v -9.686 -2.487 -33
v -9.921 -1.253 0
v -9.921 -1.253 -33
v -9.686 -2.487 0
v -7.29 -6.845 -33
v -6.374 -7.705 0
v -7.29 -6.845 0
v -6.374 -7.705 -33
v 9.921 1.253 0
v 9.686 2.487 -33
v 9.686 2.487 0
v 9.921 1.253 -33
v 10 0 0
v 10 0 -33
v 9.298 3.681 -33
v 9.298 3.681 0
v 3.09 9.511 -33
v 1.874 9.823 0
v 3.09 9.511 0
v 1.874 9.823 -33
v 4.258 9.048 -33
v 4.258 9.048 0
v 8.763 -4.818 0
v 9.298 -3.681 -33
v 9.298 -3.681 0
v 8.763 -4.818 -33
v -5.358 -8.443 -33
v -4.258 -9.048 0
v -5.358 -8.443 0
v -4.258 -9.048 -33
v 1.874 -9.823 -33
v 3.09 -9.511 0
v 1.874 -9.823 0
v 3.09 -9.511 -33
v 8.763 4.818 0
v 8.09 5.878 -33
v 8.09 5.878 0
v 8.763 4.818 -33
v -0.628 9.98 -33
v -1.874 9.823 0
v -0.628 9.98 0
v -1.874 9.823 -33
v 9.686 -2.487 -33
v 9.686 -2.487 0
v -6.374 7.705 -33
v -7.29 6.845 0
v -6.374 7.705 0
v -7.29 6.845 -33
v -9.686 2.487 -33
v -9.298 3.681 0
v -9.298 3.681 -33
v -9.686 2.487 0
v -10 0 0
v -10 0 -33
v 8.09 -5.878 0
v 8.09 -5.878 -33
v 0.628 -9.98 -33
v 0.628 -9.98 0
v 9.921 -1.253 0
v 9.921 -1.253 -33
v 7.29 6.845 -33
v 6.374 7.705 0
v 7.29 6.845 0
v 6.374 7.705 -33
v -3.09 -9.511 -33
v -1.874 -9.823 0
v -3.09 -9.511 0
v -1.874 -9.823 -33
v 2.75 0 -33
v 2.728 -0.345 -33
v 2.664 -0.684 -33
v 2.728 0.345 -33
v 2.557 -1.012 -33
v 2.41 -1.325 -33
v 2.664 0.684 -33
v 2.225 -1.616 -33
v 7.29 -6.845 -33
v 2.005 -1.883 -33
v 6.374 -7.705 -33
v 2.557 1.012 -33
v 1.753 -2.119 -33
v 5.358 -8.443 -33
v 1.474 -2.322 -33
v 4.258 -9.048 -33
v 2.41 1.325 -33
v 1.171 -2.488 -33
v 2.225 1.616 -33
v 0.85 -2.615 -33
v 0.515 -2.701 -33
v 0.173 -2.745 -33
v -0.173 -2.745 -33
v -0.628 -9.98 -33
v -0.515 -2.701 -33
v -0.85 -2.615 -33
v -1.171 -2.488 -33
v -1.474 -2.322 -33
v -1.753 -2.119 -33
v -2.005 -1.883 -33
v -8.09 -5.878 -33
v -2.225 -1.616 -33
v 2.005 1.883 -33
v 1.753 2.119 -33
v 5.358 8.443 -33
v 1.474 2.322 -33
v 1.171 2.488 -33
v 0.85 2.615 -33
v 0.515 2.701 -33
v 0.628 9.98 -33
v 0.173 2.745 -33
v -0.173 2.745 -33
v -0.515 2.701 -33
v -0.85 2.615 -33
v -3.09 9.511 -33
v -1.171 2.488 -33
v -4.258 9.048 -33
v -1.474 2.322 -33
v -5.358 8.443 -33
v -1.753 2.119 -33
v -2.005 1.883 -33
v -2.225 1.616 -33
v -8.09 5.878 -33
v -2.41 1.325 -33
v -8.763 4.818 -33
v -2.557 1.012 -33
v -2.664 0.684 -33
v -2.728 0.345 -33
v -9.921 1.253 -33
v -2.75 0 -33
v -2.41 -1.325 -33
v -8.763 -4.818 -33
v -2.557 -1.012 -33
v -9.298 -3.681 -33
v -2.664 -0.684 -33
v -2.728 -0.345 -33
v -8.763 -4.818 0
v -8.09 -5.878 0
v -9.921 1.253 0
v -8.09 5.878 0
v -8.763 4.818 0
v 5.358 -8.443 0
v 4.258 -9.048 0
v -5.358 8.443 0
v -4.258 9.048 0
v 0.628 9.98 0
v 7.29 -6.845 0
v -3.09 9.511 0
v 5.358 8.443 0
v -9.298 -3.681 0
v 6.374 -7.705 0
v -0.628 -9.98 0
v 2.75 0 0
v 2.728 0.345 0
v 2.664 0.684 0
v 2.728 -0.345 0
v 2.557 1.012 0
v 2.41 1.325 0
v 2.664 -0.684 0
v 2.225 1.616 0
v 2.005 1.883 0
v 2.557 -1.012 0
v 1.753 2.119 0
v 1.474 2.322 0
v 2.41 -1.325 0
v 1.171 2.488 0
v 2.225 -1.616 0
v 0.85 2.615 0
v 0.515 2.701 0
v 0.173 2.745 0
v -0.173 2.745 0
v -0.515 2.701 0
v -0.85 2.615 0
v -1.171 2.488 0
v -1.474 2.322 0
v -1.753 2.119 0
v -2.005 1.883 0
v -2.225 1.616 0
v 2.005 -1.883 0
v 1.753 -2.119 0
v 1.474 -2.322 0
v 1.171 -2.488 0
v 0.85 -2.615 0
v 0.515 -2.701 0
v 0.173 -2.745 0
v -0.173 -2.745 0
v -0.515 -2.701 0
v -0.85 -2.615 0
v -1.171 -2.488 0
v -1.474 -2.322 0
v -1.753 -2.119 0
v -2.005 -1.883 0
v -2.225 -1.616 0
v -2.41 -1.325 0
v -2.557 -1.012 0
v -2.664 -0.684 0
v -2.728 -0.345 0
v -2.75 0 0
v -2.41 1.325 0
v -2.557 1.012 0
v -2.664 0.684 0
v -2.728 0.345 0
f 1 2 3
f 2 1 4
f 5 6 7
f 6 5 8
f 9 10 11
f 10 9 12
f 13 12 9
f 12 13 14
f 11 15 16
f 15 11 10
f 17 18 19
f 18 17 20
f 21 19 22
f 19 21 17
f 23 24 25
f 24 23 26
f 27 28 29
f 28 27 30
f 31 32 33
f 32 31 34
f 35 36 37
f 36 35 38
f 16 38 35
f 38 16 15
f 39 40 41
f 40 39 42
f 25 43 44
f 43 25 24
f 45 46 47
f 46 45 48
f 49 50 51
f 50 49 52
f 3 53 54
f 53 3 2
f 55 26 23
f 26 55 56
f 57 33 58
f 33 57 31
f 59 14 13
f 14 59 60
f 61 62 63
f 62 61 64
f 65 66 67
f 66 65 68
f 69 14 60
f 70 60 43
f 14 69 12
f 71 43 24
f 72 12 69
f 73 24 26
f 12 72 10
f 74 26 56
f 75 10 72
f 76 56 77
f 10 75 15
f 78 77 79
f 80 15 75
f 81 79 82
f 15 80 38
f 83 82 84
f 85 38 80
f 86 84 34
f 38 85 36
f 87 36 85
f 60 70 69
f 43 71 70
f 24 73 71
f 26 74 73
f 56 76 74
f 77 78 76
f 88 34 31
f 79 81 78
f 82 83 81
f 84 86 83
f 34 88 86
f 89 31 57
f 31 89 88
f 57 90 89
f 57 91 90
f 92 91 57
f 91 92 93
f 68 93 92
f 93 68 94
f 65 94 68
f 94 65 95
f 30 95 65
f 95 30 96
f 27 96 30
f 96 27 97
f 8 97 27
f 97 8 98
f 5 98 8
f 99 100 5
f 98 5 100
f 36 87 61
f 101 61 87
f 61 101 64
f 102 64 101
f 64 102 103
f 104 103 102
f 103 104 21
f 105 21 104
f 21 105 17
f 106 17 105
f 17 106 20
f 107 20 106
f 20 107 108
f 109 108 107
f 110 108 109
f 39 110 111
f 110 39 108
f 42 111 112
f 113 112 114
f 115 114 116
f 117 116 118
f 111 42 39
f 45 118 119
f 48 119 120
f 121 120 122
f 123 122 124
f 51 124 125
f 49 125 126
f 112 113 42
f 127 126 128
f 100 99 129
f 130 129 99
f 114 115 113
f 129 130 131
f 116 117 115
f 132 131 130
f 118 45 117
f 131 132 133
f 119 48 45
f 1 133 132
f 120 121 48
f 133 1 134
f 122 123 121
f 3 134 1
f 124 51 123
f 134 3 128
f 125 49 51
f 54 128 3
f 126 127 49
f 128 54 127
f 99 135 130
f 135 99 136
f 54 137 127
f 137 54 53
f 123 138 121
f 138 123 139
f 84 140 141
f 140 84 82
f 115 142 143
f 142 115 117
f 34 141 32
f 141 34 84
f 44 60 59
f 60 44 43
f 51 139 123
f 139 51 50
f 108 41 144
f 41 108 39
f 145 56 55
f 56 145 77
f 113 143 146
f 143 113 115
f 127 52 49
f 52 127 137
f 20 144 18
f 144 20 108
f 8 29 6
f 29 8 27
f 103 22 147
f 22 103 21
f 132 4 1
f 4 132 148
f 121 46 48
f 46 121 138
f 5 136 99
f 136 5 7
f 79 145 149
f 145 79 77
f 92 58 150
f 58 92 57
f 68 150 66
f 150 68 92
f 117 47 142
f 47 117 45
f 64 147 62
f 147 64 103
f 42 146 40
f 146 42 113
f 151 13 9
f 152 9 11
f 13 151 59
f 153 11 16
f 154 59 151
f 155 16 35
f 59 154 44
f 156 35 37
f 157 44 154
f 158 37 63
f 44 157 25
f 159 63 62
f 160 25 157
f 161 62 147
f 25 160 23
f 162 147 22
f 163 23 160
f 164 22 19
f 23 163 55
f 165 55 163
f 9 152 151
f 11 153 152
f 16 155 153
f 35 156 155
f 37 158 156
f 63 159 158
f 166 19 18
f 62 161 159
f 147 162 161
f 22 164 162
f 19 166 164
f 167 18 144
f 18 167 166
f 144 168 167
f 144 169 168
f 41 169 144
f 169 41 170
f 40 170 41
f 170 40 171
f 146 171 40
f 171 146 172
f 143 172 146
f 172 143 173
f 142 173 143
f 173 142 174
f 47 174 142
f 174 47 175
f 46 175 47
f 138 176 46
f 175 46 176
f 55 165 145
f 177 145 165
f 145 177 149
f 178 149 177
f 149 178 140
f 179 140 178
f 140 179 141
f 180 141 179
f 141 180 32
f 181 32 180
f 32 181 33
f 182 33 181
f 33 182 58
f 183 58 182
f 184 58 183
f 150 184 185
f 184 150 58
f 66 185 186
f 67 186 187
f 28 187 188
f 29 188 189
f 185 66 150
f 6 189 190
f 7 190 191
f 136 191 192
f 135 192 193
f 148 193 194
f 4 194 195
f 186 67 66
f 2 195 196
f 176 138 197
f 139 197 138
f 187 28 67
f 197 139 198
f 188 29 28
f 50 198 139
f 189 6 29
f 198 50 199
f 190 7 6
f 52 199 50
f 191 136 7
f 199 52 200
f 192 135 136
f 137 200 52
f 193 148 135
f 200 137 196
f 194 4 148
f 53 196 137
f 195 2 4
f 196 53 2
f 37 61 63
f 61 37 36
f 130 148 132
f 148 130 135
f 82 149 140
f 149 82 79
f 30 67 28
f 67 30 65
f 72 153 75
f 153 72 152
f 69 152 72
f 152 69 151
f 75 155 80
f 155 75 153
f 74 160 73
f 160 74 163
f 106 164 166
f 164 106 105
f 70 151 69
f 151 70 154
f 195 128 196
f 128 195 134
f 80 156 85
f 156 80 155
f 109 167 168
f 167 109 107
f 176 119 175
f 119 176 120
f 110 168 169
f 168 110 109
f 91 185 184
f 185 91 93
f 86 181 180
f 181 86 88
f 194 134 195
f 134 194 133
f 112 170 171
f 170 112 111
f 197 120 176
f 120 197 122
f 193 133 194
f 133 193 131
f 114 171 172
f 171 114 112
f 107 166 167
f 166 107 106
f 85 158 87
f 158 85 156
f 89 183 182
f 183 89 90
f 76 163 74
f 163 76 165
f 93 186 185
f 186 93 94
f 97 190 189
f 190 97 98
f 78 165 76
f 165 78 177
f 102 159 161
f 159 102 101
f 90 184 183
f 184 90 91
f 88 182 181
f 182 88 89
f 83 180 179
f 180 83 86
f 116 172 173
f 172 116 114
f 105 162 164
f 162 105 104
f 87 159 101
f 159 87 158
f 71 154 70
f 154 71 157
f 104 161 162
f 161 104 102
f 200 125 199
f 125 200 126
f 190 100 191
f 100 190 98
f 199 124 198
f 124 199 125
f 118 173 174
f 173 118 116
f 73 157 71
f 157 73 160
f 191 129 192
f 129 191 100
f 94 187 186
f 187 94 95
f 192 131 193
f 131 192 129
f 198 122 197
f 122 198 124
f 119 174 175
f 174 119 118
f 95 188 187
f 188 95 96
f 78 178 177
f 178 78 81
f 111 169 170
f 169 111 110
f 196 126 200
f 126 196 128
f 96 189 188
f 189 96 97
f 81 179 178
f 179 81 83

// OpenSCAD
$fn = 50;


difference() {
	union() {
		translate(v = [0, 0, -33.0000000000]) {
			cylinder(h = 33, r = 10.0000000000);
		}
	}
	union() {
		#translate(v = [0, 0, -33]) {
			cylinder(h = 33, r = 2.7500000000);
		}
	}
}
